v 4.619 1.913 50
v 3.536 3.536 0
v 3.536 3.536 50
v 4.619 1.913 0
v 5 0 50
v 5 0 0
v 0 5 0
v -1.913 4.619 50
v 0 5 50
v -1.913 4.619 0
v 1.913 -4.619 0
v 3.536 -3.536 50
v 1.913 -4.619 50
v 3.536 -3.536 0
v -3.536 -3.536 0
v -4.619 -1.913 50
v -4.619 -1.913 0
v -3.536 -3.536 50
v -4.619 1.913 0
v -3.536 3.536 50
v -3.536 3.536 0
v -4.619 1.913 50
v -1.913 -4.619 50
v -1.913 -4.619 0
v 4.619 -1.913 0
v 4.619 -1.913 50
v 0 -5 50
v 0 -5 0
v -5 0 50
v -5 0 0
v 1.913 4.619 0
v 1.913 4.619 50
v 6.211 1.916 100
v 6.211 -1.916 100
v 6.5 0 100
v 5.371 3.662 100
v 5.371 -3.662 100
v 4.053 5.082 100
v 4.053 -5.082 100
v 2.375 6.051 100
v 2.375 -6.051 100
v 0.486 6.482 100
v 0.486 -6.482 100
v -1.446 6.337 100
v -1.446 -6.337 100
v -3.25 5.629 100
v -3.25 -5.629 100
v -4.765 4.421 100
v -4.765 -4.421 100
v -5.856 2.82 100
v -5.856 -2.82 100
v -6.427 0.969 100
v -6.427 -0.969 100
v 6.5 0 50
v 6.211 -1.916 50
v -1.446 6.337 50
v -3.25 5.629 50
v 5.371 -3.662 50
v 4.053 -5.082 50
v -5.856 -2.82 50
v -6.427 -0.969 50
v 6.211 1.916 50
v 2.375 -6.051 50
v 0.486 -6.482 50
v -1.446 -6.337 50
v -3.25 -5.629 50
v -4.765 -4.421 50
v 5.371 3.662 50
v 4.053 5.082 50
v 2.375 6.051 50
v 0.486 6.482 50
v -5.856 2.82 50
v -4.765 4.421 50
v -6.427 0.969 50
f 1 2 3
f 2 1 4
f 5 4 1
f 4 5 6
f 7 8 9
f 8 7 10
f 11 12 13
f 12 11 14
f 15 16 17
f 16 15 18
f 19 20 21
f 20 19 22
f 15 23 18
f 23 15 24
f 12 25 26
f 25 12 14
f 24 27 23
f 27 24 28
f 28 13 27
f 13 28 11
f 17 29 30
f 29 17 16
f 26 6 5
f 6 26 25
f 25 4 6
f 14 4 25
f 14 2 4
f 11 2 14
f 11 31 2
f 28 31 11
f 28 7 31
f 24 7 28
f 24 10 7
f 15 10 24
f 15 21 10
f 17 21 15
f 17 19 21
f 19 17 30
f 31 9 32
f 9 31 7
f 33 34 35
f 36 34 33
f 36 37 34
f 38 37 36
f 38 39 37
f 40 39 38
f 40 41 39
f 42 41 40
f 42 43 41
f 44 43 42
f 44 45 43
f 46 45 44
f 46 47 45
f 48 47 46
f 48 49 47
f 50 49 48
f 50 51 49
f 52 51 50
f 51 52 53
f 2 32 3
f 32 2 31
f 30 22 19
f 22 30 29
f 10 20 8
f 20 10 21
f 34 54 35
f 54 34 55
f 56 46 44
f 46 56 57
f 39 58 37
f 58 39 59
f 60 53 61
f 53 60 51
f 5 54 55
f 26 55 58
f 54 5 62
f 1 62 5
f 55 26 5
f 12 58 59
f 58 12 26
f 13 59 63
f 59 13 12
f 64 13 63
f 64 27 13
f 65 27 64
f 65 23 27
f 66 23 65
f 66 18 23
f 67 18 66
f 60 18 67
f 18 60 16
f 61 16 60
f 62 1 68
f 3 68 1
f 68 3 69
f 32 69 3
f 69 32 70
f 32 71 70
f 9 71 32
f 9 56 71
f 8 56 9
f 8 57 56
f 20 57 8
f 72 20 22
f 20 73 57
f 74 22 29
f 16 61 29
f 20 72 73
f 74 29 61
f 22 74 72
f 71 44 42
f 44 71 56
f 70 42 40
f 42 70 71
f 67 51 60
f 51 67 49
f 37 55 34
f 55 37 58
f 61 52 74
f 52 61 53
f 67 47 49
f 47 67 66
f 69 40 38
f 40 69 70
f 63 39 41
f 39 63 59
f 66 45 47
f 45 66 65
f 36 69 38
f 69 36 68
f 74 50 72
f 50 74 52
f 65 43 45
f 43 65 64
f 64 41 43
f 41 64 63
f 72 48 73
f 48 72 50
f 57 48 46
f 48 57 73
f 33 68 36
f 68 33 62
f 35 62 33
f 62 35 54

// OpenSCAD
module flatheadscrew(head_diameter, tail_diameter) {
    linear_extrude(height = 100) 
    circle(d = tail_diameter);
    translate([0, 0, 50])
    linear_extrude(height = 50) 
    circle(d = head_diameter);
}

flatheadscrew(head_diameter = 13, tail_diameter = 10);
